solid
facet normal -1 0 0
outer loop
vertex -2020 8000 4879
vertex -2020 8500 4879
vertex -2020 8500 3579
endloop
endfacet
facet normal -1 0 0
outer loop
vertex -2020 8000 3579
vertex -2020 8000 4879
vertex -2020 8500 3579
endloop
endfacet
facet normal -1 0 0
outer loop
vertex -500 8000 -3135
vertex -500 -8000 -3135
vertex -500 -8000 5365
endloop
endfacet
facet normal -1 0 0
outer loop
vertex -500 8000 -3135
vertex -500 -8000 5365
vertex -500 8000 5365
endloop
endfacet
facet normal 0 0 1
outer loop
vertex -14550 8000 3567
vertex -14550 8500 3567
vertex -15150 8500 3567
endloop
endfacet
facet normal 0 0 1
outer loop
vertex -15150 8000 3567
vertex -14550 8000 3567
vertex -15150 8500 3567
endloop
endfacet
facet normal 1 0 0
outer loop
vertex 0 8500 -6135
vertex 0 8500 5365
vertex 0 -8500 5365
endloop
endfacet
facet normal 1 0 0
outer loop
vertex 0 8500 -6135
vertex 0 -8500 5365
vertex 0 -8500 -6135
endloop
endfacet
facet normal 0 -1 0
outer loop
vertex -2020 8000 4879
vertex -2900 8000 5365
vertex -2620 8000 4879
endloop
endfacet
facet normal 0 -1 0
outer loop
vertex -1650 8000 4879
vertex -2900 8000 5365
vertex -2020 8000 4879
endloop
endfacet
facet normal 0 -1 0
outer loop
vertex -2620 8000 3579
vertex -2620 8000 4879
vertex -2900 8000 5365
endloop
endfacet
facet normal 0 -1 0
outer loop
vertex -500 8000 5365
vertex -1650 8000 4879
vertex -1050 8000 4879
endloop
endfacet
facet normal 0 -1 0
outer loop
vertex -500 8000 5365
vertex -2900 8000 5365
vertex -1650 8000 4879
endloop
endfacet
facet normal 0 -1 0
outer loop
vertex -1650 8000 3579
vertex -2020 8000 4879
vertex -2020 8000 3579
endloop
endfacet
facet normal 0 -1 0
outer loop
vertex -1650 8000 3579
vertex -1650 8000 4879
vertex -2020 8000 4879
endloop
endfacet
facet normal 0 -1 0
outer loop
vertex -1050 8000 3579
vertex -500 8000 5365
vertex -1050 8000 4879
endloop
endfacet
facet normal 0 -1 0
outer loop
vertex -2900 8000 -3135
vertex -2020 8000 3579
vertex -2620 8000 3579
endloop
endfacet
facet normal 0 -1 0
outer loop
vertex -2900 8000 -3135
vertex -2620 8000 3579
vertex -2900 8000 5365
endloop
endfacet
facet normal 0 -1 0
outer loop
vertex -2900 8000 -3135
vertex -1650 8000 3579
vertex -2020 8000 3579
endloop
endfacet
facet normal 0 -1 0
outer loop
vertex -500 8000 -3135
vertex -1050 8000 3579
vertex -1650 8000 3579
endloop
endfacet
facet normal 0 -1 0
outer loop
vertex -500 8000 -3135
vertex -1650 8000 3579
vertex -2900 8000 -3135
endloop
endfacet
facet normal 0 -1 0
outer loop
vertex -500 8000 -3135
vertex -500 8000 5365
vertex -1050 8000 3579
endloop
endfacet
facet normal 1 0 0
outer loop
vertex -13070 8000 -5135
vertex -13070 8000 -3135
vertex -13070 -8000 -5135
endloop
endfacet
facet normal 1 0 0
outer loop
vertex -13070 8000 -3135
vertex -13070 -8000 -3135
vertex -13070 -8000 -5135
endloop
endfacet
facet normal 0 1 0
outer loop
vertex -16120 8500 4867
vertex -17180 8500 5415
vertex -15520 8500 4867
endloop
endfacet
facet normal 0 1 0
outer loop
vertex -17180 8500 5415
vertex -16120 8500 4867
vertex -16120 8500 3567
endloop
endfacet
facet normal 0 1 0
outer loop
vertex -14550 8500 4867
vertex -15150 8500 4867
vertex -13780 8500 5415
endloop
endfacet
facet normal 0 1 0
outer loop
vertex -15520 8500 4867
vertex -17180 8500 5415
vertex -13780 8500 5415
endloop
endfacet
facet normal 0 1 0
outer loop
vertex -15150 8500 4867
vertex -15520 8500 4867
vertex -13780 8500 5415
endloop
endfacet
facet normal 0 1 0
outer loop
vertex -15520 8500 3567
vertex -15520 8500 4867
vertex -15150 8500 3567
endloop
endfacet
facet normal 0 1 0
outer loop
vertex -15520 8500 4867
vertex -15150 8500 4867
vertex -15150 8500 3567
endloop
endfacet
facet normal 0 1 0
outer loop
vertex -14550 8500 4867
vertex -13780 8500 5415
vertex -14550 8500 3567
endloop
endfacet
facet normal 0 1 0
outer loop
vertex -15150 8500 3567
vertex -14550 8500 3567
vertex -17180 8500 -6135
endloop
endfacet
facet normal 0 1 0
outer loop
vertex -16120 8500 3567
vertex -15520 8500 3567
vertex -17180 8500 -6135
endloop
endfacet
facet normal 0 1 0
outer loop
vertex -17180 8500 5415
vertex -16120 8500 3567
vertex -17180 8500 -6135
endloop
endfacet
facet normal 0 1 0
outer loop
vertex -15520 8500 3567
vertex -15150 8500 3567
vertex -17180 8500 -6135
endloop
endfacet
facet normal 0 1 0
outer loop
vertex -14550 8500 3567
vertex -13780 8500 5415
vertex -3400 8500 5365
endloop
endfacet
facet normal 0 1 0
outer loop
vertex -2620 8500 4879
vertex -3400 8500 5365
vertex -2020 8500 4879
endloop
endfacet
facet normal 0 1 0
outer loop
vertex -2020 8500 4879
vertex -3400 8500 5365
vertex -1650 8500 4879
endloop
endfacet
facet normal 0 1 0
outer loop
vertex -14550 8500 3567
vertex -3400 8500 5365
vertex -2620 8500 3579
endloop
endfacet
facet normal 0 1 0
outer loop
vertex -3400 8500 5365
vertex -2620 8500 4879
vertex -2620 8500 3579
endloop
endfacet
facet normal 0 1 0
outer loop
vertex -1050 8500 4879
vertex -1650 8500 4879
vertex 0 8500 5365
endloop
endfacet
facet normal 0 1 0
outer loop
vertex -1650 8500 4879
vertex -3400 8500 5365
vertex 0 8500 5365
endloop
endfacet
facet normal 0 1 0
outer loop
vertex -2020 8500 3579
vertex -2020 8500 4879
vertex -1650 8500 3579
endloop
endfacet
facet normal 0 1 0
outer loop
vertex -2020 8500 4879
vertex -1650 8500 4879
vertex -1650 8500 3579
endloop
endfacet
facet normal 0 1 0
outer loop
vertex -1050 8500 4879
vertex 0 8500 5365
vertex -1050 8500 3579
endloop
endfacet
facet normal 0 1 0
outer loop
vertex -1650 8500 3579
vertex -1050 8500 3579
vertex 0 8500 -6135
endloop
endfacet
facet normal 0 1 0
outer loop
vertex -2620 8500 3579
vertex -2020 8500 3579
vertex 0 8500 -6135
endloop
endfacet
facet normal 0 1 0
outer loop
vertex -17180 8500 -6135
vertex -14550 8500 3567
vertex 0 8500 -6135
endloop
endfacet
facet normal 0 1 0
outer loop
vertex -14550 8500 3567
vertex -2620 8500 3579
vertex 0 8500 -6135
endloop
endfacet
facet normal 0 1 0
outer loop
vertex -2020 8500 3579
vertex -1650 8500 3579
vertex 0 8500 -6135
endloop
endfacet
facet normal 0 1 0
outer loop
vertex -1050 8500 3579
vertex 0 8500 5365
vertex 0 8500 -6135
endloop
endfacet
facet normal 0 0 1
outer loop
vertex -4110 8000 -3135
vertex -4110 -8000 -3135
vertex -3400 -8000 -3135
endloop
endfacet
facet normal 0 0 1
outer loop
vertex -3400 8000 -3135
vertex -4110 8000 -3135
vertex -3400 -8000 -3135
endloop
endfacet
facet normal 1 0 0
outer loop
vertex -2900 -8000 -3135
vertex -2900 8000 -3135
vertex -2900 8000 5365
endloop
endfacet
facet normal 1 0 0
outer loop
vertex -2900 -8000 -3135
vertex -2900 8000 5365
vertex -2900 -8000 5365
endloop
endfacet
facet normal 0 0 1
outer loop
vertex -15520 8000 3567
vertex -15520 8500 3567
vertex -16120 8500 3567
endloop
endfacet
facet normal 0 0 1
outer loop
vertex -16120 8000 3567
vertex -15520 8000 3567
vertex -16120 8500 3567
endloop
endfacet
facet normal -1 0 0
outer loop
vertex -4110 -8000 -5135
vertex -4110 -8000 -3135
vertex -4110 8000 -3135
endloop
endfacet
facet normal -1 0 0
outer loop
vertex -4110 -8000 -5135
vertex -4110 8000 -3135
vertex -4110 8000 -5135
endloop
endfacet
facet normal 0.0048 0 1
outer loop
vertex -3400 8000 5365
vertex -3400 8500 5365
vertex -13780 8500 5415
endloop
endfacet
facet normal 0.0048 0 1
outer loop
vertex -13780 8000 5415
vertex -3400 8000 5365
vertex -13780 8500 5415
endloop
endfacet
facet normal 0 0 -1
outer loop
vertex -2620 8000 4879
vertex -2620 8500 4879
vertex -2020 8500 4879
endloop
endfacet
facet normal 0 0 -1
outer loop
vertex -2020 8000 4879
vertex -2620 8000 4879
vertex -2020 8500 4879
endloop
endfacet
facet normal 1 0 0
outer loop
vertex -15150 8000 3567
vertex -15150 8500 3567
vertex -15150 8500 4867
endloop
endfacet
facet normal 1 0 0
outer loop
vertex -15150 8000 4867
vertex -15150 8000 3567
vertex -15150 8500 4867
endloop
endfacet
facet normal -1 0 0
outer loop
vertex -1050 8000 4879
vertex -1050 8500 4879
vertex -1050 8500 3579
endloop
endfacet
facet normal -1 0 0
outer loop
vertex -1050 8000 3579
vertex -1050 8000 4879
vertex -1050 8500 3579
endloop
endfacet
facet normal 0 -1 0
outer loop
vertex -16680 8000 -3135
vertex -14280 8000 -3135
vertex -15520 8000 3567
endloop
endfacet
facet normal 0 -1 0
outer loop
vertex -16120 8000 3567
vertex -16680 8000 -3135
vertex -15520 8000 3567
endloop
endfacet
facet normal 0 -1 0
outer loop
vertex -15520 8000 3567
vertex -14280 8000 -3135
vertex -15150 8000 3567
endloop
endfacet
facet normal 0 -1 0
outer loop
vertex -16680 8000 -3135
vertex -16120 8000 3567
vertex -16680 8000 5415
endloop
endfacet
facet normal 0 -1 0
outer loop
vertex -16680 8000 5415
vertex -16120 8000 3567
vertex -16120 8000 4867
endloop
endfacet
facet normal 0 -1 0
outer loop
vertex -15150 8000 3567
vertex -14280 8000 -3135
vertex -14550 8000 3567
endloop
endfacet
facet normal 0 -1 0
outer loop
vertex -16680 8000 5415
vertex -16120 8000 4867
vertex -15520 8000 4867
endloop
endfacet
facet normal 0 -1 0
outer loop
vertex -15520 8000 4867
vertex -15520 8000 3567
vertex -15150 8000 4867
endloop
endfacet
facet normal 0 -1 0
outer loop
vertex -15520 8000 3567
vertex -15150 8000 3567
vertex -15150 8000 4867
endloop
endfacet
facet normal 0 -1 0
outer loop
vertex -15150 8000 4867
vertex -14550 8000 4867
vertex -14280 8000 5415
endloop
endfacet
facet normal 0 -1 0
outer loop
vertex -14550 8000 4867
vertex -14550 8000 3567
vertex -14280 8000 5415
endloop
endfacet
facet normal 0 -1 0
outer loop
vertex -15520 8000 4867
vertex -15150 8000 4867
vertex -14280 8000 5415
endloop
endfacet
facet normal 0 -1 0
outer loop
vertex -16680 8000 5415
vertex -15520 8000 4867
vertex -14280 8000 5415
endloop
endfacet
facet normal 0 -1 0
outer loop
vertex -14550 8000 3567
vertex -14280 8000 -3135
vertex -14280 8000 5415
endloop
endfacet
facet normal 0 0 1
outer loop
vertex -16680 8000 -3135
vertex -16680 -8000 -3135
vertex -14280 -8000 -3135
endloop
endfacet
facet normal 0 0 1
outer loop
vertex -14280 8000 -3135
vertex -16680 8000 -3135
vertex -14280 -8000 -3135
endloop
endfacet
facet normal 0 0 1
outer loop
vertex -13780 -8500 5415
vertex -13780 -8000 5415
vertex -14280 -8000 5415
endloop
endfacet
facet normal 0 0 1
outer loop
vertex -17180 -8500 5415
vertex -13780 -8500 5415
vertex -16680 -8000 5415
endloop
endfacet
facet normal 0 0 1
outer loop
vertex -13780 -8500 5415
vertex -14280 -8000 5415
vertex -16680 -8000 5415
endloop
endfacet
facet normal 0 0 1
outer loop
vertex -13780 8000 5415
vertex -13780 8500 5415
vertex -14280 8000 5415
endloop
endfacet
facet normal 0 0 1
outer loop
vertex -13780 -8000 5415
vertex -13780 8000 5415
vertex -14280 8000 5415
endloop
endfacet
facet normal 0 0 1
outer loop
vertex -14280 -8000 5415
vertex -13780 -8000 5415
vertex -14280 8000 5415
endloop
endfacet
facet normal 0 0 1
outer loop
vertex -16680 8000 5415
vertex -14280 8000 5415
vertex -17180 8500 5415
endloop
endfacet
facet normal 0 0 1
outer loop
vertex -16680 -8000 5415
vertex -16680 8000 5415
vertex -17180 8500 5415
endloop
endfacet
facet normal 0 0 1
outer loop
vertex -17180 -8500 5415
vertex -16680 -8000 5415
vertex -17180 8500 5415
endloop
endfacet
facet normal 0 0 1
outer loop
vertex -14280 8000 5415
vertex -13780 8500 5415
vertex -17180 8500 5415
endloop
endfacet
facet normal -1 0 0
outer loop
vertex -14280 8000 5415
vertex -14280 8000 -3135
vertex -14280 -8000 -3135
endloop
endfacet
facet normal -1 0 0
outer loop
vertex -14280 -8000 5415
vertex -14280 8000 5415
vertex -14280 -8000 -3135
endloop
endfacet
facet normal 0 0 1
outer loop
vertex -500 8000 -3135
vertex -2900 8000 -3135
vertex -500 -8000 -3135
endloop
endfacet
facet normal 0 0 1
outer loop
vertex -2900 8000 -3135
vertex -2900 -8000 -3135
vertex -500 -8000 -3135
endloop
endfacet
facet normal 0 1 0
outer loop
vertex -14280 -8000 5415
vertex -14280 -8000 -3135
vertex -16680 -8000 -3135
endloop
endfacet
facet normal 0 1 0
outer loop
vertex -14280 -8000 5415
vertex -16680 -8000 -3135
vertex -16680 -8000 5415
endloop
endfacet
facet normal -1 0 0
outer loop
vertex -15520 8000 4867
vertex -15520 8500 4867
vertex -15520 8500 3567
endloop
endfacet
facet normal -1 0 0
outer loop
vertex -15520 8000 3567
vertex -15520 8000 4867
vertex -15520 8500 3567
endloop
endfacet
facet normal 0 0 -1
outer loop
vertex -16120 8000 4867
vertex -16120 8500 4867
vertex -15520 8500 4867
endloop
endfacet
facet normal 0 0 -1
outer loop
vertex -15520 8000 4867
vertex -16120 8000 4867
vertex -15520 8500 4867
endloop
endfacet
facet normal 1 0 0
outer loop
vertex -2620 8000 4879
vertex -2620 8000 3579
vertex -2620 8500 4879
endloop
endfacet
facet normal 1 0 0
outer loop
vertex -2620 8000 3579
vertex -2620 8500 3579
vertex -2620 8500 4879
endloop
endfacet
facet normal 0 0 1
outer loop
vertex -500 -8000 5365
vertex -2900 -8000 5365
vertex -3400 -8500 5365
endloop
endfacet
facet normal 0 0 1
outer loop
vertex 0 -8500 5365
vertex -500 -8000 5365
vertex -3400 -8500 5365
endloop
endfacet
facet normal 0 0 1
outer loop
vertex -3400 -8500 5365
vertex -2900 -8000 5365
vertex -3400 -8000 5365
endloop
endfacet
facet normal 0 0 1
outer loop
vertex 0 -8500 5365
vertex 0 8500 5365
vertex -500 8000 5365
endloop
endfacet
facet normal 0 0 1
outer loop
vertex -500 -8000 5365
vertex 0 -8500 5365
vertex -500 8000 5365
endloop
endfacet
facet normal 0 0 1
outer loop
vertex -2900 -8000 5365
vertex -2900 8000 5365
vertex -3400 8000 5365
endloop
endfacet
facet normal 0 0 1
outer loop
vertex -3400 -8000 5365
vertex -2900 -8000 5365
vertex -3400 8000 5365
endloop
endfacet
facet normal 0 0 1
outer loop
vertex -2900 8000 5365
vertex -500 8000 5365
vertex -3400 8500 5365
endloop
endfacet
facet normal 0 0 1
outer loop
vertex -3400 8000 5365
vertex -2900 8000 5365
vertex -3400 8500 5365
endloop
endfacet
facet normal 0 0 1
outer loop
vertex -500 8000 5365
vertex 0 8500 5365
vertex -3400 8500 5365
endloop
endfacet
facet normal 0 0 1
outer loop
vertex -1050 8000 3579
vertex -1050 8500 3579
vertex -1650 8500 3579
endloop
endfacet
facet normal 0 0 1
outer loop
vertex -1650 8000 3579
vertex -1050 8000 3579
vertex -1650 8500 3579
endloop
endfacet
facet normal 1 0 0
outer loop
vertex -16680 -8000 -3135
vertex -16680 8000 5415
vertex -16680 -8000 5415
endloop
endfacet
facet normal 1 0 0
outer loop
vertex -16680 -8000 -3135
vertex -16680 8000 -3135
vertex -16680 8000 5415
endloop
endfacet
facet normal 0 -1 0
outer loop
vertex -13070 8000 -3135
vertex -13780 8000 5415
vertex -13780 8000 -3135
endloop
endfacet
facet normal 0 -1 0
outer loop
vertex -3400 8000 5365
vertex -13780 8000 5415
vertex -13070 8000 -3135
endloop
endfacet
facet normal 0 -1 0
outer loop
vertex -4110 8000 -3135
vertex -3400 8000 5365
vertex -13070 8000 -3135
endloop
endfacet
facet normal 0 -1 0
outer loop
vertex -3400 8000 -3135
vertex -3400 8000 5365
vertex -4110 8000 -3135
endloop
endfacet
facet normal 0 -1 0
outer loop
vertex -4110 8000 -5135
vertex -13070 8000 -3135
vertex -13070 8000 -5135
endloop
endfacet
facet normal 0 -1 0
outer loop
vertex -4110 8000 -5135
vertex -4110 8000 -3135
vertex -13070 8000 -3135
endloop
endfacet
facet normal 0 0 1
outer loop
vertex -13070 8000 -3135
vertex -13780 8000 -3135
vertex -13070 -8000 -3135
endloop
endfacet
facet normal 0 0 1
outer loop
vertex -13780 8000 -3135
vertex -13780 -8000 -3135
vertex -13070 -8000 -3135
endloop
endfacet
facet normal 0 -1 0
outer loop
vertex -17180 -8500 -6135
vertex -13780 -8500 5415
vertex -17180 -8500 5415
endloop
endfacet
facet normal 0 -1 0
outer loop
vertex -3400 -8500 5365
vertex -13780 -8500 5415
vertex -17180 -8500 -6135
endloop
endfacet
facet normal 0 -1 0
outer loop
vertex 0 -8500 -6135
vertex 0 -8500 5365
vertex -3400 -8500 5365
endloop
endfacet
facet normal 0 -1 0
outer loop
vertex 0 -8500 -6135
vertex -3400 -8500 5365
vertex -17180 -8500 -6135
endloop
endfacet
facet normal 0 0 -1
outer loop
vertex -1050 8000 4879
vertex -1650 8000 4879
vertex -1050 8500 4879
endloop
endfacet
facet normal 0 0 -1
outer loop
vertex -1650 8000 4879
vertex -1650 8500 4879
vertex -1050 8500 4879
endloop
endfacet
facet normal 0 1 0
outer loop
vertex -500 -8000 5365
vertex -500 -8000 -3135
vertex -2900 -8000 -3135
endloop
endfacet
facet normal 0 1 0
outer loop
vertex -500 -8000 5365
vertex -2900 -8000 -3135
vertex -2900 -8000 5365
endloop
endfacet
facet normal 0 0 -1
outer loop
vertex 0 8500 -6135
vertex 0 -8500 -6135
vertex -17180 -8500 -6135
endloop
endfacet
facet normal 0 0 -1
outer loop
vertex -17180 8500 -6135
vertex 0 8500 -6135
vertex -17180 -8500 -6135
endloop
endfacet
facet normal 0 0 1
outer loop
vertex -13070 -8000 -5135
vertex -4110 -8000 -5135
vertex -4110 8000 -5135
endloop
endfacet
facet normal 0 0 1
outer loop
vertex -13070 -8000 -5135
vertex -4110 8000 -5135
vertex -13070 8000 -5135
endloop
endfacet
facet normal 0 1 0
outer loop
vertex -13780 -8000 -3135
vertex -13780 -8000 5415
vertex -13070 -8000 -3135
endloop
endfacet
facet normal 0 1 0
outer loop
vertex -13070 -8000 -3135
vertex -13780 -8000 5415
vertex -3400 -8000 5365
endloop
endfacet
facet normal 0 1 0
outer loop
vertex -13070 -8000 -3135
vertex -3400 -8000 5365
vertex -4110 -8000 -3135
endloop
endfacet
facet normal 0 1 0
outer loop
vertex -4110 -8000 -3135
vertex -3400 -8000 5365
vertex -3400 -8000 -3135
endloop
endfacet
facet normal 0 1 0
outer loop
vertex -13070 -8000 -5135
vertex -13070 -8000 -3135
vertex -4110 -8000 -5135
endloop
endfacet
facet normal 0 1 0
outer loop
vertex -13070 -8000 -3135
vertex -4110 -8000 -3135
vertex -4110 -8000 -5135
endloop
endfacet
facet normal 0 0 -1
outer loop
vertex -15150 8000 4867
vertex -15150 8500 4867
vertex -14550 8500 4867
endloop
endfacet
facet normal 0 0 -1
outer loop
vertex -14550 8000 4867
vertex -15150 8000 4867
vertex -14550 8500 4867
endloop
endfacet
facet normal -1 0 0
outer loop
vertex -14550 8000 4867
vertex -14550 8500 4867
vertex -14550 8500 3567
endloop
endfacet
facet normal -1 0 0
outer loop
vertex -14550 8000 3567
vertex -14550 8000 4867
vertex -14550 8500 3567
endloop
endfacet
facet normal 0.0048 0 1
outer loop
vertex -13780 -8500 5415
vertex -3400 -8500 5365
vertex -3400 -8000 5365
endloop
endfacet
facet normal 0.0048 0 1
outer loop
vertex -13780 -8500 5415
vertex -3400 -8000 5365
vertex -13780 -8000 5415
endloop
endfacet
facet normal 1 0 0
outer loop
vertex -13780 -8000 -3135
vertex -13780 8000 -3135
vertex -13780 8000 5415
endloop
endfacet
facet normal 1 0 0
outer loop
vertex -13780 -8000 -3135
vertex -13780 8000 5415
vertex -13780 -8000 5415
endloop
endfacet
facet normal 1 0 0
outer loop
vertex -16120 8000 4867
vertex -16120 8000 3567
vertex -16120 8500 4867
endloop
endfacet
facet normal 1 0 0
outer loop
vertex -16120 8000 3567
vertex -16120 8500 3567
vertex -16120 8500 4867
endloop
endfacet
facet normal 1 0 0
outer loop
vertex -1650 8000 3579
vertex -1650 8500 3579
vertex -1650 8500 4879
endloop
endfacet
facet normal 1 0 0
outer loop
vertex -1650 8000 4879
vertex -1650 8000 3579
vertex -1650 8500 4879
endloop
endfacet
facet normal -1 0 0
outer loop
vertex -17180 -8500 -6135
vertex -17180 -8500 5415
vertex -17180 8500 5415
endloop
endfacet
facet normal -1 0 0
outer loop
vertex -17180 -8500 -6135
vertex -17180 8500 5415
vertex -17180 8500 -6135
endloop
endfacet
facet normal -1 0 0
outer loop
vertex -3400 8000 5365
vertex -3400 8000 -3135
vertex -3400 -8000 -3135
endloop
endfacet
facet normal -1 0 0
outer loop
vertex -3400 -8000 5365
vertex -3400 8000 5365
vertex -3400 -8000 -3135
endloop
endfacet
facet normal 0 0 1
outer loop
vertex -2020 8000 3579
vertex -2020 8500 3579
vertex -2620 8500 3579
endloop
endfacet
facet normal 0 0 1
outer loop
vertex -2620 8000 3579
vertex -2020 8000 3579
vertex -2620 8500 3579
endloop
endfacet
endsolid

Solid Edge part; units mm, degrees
sketch "Sketch1" plane through (-8590, -8500, 0) normal (0, -1, 0) x (1, 0, 0)
  line L0 (-8590, -3135) -> (-8590, -6135)
  line L1 (-4480, -6135) -> (-8590, -6135)
  line L2 (-4480, -3135) -> (-4480, -6135)
  line L3 (-8590, -3135) -> (-4480, -3135)
extrude "Protrusion1" add sketch "Sketch1" against normal blind 17000
sketch "Sketch2" plane through (-1500, -8500, -4435) normal (0, -1, 0) x (1, 0, 0)
  line L0 (-1500, -700) -> (-12280, -700)
  line L1 (-1500, -1700) -> (-1500, -700)
  line L2 (-12280, -1700) -> (-1500, -1700)
  line L3 (-12280, -700) -> (-12280, -1700)
extrude "ProtrusiónExtruida_4" add sketch "Sketch2" against normal blind 17000
sketch "Sketch3" plane through (-15680, 0, -3135) normal (0, 0, 1) x (0, 1, 0)
  line L0 (-8500, -15180) -> (8500, -15180)
  line L1 (8500, -15180) -> (8500, -15680)
  line L2 (8500, -15680) -> (-8500, -15680)
  line L3 (-8500, -15680) -> (-8500, -15180)
extrude "ProtrusiónExtruida_5" add sketch "Sketch3" along normal blind 8500
sketch "Sketch4" plane through (-15680, 0, -3135) normal (0, 0, 1) x (0, 1, 0)
  line L0 (8500, 1000) -> (-8500, 1000)
  line L1 (-8500, 1000) -> (-8500, 1500)
  line L2 (-8500, 1500) -> (8500, 1500)
  line L3 (8500, 1500) -> (8500, 1000)
extrude "ProtrusiónExtruida_6" add sketch "Sketch4" along normal blind 8550
sketch "Sketch5" plane through (-8590, -8500, 0) normal (0, -1, 0) x (1, 0, 0)
  line L0 (8590, -3135) -> (8590, -6135)
  line L1 (8590, -6135) -> (4480, -6135)
  line L2 (4480, -3135) -> (4480, -6135)
  line L3 (4480, -3135) -> (8590, -3135)
extrude "ProtrusiónExtruida_7" add sketch "Sketch5" against normal blind 17000
sketch "Sketch6" plane through (-15194.5, 0, -3135) normal (0, 0, 1) x (0, 1, 0)
  line L0 (8500, -914.5) -> (-8500, -914.5)
  line L1 (-8500, -914.5) -> (-8500, -1414.5)
  line L2 (8500, -1414.5) -> (-8500, -1414.5)
  line L3 (8500, -1414.5) -> (8500, -914.5)
extrude "ProtrusiónExtruida_11" add sketch "Sketch6" along normal blind 8550
sketch "Sketch7" plane through (-15194.5, 0, -3135) normal (0, 0, 1) x (0, 1, 0)
  line L0 (8500, -12294.5) -> (-8500, -12294.5)
  line L1 (-8500, -12294.5) -> (-8500, -11794.5)
  line L2 (8500, -11794.5) -> (-8500, -11794.5)
  line L3 (8500, -11794.5) -> (8500, -12294.5)
extrude "ProtrusiónExtruida_12" add sketch "Sketch7" along normal blind 8500
sketch "Sketch8" plane through (-8590, -8500, -360) normal (0, -1, 0) x (1, 0, 0)
  line L0 (5190, 5725) -> (-5190, 5775)
  line L1 (-5190, 5775) -> (-5190, -2775)
  line L2 (-5190, -2775) -> (-4480, -2775)
  line L3 (-4480, -2775) -> (-4480, -4775)
  line L4 (-4480, -4775) -> (4480, -4775)
  line L5 (4480, -4775) -> (4480, -2775)
  line L6 (4480, -2775) -> (5190, -2775)
  line L7 (5190, -2775) -> (5190, 5725)
  line L8 (-8090, 5775) -> (-5690, 5775)
  line L9 (-5690, 5775) -> (-5690, -2775)
  line L10 (-5690, -2775) -> (-8090, -2775)
  line L11 (-8090, -2775) -> (-8090, 5775)
  line L12 (5690, 5725) -> (8090, 5725)
  line L13 (8090, 5725) -> (8090, -2775)
  line L14 (8090, -2775) -> (5690, -2775)
  line L15 (5690, -2775) -> (5690, 5725)
extrude "ProtrusiónExtruida_14" add sketch "Sketch8" against normal blind 500
sketch "Sketch9" plane through (-8590, 8500, -360) normal (0, 1, 0) x (-1, 0, 0)
  line L0 (-5690, 5725) -> (-5690, -2775)
  line L1 (-5690, -2775) -> (-8090, -2775)
  line L2 (-8090, -2775) -> (-8090, 5725)
  line L3 (-8090, 5725) -> (-5690, 5725)
  line L4 (-4480, -4775) -> (-4480, -2775)
  line L5 (-4480, -2775) -> (-5190, -2775)
  line L6 (-5190, -2775) -> (-5190, 5725)
  line L7 (-5190, 5725) -> (5190, 5775)
  line L8 (5190, 5775) -> (5190, -2775)
  line L9 (5190, -2775) -> (4480, -2775)
  line L10 (4480, -2775) -> (4480, -4775)
  line L11 (4480, -4775) -> (-4480, -4775)
  line L12 (5690, -2775) -> (8090, -2775)
  line L13 (8090, -2775) -> (8090, 5775)
  line L14 (8090, 5775) -> (5690, 5775)
  line L15 (5690, 5775) -> (5690, -2775)
extrude "Protrusion2" add sketch "Sketch9" against normal blind 500
sketch "Sketch10" plane through (-8590, 8500, 115) normal (0, 1, 0) x (-1, 0, 0)
  line L0 (6560, 3452) -> (6560, 4752)
  line L1 (6560, 4752) -> (5960, 4752)
  line L2 (5960, 4752) -> (5960, 3452)
  line L3 (5960, 3452) -> (6560, 3452)
  line L4 (6930, 4752) -> (6930, 3452)
  line L5 (6930, 3452) -> (7530, 3452)
  line L6 (7530, 3452) -> (7530, 4752)
  line L7 (7530, 4752) -> (6930, 4752)
extrude "Cutout1" cut sketch "Sketch10" against normal blind 563.6782
sketch "Sketch11" plane through (-8590, 8500, 115) normal (0, 1, 0) x (-1, 0, 0)
  line L0 (-7540, 3464) -> (-6940, 3464)
  line L1 (-6940, 3464) -> (-6940, 4764)
  line L2 (-6940, 4764) -> (-7540, 4764)
  line L3 (-7540, 4764) -> (-7540, 3464)
  line L4 (-6570, 3464) -> (-5970, 3464)
  line L5 (-5970, 3464) -> (-5970, 4764)
  line L6 (-5970, 4764) -> (-6570, 4764)
  line L7 (-6570, 4764) -> (-6570, 3464)
extrude "VaciadoExtruido_2" cut sketch "Sketch11" against normal blind 595.0009
properties material "Aluminum, 6061-T6"
